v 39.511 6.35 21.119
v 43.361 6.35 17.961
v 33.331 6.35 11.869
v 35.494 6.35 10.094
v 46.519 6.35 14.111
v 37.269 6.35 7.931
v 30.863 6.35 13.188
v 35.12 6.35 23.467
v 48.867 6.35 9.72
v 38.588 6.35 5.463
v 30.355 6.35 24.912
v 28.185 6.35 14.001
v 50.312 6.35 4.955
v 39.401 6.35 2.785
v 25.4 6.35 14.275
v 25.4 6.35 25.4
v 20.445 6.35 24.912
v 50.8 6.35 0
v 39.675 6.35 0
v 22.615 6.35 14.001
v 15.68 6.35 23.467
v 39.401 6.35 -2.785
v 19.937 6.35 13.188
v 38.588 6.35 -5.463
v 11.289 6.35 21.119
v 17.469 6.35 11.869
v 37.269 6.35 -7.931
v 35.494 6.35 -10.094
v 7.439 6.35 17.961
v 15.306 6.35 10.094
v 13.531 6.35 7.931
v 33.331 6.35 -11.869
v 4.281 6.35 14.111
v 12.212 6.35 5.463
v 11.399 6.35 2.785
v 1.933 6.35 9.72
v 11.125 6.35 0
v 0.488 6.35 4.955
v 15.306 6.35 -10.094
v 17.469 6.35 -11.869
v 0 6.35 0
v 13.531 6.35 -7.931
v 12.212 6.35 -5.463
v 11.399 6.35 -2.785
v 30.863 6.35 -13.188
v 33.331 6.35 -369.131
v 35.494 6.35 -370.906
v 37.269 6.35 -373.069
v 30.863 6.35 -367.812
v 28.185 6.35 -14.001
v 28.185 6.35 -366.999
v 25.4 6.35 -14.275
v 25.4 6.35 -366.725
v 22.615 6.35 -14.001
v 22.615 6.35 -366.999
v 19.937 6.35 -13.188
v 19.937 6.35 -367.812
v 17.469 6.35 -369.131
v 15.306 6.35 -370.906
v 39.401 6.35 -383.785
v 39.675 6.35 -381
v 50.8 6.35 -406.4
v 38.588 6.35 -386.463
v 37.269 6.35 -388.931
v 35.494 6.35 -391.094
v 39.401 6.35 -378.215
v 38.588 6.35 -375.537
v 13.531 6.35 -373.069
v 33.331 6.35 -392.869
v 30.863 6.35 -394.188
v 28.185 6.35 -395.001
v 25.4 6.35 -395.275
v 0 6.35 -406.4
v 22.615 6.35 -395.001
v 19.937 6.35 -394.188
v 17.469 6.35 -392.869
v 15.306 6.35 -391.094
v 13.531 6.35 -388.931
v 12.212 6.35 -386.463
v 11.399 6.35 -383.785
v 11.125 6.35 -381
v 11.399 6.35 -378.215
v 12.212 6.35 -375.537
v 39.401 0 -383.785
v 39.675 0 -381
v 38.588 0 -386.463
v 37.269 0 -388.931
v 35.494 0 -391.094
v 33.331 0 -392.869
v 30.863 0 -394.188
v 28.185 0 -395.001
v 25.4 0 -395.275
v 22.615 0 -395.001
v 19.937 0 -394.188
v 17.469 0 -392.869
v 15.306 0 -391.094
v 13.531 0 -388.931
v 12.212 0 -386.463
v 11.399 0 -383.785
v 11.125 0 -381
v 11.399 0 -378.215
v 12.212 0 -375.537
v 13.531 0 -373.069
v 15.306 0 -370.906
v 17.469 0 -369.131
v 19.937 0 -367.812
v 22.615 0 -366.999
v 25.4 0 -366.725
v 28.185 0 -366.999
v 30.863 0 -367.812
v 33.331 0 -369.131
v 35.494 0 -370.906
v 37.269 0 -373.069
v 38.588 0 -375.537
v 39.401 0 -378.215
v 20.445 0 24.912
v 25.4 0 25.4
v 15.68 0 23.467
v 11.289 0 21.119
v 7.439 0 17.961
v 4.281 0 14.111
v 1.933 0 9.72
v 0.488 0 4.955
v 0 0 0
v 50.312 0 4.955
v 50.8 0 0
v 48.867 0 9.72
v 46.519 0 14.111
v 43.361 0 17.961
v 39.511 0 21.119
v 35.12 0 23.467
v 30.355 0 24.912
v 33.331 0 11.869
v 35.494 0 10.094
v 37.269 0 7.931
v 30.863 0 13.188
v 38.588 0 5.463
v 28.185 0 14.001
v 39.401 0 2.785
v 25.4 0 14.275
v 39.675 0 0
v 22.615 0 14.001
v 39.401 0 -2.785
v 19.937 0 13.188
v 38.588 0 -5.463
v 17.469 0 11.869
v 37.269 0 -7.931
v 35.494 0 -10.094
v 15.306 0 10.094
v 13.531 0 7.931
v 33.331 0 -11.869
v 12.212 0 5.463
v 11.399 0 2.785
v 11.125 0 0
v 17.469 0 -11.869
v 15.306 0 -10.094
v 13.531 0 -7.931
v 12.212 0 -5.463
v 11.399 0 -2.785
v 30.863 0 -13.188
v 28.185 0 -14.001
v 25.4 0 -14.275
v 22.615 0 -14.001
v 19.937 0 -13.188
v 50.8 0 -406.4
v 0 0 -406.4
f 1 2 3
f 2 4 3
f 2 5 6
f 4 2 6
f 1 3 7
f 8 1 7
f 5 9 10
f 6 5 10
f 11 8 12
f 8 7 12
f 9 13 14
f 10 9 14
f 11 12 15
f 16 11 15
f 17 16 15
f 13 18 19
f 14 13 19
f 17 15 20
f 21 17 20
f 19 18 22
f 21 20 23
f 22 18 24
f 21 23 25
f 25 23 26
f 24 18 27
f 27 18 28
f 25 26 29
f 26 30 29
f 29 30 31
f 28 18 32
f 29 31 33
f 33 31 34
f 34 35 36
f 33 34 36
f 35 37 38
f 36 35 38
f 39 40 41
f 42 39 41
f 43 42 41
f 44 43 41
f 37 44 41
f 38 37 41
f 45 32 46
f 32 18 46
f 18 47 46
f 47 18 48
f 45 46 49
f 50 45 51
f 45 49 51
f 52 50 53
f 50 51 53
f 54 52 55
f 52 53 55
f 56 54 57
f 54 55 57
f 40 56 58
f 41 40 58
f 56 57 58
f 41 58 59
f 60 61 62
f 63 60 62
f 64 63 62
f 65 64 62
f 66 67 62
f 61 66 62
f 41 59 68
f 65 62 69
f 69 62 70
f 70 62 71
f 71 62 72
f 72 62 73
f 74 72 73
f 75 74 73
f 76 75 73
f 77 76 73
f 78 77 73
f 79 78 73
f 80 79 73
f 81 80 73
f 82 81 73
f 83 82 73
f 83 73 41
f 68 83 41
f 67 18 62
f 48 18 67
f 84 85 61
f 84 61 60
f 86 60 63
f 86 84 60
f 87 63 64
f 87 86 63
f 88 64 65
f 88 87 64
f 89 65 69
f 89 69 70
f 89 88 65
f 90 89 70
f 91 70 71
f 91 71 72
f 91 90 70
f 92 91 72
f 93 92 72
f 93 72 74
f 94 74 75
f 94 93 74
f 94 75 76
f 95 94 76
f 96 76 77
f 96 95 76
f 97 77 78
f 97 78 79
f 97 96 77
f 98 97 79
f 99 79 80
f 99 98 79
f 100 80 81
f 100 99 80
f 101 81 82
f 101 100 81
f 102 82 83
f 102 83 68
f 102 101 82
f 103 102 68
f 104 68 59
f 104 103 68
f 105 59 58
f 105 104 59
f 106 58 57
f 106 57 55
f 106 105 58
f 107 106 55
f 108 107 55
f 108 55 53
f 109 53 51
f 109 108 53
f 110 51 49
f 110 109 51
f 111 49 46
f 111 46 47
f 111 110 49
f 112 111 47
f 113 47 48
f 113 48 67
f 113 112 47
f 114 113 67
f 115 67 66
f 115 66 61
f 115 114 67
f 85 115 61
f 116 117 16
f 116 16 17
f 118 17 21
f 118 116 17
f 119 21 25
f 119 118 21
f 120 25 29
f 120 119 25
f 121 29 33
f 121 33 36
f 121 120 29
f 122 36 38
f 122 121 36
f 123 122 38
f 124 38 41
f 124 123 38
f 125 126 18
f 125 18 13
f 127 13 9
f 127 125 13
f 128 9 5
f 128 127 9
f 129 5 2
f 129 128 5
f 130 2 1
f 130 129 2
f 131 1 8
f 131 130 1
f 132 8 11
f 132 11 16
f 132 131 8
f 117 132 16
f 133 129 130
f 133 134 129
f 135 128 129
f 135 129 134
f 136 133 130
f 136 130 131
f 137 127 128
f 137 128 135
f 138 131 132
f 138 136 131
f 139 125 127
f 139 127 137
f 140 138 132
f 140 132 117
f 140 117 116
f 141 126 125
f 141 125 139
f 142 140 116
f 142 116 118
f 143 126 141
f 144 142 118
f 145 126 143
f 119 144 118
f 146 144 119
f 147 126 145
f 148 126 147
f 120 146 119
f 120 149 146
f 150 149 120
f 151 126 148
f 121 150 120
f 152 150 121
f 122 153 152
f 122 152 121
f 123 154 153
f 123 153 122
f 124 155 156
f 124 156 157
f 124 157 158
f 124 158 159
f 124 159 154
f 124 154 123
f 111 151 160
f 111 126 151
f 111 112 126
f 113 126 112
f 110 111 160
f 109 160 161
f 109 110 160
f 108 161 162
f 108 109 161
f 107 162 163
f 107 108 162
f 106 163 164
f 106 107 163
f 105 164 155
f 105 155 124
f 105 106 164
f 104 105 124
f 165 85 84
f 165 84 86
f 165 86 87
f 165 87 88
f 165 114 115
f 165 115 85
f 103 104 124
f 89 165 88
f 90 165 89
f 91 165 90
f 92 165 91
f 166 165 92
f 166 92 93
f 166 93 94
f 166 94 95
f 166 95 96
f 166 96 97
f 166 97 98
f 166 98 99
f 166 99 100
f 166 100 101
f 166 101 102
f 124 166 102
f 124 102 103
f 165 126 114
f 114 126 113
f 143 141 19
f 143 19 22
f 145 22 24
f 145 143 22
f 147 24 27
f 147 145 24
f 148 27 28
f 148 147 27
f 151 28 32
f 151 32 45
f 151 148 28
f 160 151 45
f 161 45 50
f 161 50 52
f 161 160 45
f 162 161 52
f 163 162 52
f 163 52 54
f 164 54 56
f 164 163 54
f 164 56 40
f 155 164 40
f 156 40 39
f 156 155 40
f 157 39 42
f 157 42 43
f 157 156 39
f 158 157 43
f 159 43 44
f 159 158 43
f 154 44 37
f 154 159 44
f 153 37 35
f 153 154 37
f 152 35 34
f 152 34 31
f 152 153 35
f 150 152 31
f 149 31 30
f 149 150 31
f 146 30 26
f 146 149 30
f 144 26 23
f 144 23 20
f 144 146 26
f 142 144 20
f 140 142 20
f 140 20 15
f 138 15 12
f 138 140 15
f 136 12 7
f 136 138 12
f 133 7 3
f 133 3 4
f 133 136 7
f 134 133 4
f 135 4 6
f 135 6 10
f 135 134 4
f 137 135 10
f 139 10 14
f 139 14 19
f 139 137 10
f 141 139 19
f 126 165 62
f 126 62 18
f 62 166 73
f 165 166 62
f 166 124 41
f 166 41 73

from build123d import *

# Parameters (mm, degrees)
SKETCH1_R           = 14.2748
BOSS_EXTRUDE1_DEPTH = 6.35


with BuildPart() as part:
    # Sketch1 → Boss-Extrude1 (new body)
    with BuildSketch(Plane(origin=(0, 0, 0), x_dir=(1, 0, 0), z_dir=(0, 1, 0))):
        with BuildLine():
            Line((0, 0), (0, 406.4))
            Line((0, 406.4), (50.8, 406.4))
            Line((50.8, 406.4), (50.8, 0))
            ThreePointArc((50.8, 0), (43.360512242, -17.960512242), (25.4, -25.4))
            ThreePointArc((25.4, -25.4), (7.439487758, -17.960512242), (0, 0))
        make_face()
        with Locations((25.4, 0)):
            Circle(SKETCH1_R, mode=Mode.SUBTRACT)
        with Locations((25.4, 381)):
            Circle(SKETCH1_R, mode=Mode.SUBTRACT)
    extrude(amount=BOSS_EXTRUDE1_DEPTH)


solid = part.part
